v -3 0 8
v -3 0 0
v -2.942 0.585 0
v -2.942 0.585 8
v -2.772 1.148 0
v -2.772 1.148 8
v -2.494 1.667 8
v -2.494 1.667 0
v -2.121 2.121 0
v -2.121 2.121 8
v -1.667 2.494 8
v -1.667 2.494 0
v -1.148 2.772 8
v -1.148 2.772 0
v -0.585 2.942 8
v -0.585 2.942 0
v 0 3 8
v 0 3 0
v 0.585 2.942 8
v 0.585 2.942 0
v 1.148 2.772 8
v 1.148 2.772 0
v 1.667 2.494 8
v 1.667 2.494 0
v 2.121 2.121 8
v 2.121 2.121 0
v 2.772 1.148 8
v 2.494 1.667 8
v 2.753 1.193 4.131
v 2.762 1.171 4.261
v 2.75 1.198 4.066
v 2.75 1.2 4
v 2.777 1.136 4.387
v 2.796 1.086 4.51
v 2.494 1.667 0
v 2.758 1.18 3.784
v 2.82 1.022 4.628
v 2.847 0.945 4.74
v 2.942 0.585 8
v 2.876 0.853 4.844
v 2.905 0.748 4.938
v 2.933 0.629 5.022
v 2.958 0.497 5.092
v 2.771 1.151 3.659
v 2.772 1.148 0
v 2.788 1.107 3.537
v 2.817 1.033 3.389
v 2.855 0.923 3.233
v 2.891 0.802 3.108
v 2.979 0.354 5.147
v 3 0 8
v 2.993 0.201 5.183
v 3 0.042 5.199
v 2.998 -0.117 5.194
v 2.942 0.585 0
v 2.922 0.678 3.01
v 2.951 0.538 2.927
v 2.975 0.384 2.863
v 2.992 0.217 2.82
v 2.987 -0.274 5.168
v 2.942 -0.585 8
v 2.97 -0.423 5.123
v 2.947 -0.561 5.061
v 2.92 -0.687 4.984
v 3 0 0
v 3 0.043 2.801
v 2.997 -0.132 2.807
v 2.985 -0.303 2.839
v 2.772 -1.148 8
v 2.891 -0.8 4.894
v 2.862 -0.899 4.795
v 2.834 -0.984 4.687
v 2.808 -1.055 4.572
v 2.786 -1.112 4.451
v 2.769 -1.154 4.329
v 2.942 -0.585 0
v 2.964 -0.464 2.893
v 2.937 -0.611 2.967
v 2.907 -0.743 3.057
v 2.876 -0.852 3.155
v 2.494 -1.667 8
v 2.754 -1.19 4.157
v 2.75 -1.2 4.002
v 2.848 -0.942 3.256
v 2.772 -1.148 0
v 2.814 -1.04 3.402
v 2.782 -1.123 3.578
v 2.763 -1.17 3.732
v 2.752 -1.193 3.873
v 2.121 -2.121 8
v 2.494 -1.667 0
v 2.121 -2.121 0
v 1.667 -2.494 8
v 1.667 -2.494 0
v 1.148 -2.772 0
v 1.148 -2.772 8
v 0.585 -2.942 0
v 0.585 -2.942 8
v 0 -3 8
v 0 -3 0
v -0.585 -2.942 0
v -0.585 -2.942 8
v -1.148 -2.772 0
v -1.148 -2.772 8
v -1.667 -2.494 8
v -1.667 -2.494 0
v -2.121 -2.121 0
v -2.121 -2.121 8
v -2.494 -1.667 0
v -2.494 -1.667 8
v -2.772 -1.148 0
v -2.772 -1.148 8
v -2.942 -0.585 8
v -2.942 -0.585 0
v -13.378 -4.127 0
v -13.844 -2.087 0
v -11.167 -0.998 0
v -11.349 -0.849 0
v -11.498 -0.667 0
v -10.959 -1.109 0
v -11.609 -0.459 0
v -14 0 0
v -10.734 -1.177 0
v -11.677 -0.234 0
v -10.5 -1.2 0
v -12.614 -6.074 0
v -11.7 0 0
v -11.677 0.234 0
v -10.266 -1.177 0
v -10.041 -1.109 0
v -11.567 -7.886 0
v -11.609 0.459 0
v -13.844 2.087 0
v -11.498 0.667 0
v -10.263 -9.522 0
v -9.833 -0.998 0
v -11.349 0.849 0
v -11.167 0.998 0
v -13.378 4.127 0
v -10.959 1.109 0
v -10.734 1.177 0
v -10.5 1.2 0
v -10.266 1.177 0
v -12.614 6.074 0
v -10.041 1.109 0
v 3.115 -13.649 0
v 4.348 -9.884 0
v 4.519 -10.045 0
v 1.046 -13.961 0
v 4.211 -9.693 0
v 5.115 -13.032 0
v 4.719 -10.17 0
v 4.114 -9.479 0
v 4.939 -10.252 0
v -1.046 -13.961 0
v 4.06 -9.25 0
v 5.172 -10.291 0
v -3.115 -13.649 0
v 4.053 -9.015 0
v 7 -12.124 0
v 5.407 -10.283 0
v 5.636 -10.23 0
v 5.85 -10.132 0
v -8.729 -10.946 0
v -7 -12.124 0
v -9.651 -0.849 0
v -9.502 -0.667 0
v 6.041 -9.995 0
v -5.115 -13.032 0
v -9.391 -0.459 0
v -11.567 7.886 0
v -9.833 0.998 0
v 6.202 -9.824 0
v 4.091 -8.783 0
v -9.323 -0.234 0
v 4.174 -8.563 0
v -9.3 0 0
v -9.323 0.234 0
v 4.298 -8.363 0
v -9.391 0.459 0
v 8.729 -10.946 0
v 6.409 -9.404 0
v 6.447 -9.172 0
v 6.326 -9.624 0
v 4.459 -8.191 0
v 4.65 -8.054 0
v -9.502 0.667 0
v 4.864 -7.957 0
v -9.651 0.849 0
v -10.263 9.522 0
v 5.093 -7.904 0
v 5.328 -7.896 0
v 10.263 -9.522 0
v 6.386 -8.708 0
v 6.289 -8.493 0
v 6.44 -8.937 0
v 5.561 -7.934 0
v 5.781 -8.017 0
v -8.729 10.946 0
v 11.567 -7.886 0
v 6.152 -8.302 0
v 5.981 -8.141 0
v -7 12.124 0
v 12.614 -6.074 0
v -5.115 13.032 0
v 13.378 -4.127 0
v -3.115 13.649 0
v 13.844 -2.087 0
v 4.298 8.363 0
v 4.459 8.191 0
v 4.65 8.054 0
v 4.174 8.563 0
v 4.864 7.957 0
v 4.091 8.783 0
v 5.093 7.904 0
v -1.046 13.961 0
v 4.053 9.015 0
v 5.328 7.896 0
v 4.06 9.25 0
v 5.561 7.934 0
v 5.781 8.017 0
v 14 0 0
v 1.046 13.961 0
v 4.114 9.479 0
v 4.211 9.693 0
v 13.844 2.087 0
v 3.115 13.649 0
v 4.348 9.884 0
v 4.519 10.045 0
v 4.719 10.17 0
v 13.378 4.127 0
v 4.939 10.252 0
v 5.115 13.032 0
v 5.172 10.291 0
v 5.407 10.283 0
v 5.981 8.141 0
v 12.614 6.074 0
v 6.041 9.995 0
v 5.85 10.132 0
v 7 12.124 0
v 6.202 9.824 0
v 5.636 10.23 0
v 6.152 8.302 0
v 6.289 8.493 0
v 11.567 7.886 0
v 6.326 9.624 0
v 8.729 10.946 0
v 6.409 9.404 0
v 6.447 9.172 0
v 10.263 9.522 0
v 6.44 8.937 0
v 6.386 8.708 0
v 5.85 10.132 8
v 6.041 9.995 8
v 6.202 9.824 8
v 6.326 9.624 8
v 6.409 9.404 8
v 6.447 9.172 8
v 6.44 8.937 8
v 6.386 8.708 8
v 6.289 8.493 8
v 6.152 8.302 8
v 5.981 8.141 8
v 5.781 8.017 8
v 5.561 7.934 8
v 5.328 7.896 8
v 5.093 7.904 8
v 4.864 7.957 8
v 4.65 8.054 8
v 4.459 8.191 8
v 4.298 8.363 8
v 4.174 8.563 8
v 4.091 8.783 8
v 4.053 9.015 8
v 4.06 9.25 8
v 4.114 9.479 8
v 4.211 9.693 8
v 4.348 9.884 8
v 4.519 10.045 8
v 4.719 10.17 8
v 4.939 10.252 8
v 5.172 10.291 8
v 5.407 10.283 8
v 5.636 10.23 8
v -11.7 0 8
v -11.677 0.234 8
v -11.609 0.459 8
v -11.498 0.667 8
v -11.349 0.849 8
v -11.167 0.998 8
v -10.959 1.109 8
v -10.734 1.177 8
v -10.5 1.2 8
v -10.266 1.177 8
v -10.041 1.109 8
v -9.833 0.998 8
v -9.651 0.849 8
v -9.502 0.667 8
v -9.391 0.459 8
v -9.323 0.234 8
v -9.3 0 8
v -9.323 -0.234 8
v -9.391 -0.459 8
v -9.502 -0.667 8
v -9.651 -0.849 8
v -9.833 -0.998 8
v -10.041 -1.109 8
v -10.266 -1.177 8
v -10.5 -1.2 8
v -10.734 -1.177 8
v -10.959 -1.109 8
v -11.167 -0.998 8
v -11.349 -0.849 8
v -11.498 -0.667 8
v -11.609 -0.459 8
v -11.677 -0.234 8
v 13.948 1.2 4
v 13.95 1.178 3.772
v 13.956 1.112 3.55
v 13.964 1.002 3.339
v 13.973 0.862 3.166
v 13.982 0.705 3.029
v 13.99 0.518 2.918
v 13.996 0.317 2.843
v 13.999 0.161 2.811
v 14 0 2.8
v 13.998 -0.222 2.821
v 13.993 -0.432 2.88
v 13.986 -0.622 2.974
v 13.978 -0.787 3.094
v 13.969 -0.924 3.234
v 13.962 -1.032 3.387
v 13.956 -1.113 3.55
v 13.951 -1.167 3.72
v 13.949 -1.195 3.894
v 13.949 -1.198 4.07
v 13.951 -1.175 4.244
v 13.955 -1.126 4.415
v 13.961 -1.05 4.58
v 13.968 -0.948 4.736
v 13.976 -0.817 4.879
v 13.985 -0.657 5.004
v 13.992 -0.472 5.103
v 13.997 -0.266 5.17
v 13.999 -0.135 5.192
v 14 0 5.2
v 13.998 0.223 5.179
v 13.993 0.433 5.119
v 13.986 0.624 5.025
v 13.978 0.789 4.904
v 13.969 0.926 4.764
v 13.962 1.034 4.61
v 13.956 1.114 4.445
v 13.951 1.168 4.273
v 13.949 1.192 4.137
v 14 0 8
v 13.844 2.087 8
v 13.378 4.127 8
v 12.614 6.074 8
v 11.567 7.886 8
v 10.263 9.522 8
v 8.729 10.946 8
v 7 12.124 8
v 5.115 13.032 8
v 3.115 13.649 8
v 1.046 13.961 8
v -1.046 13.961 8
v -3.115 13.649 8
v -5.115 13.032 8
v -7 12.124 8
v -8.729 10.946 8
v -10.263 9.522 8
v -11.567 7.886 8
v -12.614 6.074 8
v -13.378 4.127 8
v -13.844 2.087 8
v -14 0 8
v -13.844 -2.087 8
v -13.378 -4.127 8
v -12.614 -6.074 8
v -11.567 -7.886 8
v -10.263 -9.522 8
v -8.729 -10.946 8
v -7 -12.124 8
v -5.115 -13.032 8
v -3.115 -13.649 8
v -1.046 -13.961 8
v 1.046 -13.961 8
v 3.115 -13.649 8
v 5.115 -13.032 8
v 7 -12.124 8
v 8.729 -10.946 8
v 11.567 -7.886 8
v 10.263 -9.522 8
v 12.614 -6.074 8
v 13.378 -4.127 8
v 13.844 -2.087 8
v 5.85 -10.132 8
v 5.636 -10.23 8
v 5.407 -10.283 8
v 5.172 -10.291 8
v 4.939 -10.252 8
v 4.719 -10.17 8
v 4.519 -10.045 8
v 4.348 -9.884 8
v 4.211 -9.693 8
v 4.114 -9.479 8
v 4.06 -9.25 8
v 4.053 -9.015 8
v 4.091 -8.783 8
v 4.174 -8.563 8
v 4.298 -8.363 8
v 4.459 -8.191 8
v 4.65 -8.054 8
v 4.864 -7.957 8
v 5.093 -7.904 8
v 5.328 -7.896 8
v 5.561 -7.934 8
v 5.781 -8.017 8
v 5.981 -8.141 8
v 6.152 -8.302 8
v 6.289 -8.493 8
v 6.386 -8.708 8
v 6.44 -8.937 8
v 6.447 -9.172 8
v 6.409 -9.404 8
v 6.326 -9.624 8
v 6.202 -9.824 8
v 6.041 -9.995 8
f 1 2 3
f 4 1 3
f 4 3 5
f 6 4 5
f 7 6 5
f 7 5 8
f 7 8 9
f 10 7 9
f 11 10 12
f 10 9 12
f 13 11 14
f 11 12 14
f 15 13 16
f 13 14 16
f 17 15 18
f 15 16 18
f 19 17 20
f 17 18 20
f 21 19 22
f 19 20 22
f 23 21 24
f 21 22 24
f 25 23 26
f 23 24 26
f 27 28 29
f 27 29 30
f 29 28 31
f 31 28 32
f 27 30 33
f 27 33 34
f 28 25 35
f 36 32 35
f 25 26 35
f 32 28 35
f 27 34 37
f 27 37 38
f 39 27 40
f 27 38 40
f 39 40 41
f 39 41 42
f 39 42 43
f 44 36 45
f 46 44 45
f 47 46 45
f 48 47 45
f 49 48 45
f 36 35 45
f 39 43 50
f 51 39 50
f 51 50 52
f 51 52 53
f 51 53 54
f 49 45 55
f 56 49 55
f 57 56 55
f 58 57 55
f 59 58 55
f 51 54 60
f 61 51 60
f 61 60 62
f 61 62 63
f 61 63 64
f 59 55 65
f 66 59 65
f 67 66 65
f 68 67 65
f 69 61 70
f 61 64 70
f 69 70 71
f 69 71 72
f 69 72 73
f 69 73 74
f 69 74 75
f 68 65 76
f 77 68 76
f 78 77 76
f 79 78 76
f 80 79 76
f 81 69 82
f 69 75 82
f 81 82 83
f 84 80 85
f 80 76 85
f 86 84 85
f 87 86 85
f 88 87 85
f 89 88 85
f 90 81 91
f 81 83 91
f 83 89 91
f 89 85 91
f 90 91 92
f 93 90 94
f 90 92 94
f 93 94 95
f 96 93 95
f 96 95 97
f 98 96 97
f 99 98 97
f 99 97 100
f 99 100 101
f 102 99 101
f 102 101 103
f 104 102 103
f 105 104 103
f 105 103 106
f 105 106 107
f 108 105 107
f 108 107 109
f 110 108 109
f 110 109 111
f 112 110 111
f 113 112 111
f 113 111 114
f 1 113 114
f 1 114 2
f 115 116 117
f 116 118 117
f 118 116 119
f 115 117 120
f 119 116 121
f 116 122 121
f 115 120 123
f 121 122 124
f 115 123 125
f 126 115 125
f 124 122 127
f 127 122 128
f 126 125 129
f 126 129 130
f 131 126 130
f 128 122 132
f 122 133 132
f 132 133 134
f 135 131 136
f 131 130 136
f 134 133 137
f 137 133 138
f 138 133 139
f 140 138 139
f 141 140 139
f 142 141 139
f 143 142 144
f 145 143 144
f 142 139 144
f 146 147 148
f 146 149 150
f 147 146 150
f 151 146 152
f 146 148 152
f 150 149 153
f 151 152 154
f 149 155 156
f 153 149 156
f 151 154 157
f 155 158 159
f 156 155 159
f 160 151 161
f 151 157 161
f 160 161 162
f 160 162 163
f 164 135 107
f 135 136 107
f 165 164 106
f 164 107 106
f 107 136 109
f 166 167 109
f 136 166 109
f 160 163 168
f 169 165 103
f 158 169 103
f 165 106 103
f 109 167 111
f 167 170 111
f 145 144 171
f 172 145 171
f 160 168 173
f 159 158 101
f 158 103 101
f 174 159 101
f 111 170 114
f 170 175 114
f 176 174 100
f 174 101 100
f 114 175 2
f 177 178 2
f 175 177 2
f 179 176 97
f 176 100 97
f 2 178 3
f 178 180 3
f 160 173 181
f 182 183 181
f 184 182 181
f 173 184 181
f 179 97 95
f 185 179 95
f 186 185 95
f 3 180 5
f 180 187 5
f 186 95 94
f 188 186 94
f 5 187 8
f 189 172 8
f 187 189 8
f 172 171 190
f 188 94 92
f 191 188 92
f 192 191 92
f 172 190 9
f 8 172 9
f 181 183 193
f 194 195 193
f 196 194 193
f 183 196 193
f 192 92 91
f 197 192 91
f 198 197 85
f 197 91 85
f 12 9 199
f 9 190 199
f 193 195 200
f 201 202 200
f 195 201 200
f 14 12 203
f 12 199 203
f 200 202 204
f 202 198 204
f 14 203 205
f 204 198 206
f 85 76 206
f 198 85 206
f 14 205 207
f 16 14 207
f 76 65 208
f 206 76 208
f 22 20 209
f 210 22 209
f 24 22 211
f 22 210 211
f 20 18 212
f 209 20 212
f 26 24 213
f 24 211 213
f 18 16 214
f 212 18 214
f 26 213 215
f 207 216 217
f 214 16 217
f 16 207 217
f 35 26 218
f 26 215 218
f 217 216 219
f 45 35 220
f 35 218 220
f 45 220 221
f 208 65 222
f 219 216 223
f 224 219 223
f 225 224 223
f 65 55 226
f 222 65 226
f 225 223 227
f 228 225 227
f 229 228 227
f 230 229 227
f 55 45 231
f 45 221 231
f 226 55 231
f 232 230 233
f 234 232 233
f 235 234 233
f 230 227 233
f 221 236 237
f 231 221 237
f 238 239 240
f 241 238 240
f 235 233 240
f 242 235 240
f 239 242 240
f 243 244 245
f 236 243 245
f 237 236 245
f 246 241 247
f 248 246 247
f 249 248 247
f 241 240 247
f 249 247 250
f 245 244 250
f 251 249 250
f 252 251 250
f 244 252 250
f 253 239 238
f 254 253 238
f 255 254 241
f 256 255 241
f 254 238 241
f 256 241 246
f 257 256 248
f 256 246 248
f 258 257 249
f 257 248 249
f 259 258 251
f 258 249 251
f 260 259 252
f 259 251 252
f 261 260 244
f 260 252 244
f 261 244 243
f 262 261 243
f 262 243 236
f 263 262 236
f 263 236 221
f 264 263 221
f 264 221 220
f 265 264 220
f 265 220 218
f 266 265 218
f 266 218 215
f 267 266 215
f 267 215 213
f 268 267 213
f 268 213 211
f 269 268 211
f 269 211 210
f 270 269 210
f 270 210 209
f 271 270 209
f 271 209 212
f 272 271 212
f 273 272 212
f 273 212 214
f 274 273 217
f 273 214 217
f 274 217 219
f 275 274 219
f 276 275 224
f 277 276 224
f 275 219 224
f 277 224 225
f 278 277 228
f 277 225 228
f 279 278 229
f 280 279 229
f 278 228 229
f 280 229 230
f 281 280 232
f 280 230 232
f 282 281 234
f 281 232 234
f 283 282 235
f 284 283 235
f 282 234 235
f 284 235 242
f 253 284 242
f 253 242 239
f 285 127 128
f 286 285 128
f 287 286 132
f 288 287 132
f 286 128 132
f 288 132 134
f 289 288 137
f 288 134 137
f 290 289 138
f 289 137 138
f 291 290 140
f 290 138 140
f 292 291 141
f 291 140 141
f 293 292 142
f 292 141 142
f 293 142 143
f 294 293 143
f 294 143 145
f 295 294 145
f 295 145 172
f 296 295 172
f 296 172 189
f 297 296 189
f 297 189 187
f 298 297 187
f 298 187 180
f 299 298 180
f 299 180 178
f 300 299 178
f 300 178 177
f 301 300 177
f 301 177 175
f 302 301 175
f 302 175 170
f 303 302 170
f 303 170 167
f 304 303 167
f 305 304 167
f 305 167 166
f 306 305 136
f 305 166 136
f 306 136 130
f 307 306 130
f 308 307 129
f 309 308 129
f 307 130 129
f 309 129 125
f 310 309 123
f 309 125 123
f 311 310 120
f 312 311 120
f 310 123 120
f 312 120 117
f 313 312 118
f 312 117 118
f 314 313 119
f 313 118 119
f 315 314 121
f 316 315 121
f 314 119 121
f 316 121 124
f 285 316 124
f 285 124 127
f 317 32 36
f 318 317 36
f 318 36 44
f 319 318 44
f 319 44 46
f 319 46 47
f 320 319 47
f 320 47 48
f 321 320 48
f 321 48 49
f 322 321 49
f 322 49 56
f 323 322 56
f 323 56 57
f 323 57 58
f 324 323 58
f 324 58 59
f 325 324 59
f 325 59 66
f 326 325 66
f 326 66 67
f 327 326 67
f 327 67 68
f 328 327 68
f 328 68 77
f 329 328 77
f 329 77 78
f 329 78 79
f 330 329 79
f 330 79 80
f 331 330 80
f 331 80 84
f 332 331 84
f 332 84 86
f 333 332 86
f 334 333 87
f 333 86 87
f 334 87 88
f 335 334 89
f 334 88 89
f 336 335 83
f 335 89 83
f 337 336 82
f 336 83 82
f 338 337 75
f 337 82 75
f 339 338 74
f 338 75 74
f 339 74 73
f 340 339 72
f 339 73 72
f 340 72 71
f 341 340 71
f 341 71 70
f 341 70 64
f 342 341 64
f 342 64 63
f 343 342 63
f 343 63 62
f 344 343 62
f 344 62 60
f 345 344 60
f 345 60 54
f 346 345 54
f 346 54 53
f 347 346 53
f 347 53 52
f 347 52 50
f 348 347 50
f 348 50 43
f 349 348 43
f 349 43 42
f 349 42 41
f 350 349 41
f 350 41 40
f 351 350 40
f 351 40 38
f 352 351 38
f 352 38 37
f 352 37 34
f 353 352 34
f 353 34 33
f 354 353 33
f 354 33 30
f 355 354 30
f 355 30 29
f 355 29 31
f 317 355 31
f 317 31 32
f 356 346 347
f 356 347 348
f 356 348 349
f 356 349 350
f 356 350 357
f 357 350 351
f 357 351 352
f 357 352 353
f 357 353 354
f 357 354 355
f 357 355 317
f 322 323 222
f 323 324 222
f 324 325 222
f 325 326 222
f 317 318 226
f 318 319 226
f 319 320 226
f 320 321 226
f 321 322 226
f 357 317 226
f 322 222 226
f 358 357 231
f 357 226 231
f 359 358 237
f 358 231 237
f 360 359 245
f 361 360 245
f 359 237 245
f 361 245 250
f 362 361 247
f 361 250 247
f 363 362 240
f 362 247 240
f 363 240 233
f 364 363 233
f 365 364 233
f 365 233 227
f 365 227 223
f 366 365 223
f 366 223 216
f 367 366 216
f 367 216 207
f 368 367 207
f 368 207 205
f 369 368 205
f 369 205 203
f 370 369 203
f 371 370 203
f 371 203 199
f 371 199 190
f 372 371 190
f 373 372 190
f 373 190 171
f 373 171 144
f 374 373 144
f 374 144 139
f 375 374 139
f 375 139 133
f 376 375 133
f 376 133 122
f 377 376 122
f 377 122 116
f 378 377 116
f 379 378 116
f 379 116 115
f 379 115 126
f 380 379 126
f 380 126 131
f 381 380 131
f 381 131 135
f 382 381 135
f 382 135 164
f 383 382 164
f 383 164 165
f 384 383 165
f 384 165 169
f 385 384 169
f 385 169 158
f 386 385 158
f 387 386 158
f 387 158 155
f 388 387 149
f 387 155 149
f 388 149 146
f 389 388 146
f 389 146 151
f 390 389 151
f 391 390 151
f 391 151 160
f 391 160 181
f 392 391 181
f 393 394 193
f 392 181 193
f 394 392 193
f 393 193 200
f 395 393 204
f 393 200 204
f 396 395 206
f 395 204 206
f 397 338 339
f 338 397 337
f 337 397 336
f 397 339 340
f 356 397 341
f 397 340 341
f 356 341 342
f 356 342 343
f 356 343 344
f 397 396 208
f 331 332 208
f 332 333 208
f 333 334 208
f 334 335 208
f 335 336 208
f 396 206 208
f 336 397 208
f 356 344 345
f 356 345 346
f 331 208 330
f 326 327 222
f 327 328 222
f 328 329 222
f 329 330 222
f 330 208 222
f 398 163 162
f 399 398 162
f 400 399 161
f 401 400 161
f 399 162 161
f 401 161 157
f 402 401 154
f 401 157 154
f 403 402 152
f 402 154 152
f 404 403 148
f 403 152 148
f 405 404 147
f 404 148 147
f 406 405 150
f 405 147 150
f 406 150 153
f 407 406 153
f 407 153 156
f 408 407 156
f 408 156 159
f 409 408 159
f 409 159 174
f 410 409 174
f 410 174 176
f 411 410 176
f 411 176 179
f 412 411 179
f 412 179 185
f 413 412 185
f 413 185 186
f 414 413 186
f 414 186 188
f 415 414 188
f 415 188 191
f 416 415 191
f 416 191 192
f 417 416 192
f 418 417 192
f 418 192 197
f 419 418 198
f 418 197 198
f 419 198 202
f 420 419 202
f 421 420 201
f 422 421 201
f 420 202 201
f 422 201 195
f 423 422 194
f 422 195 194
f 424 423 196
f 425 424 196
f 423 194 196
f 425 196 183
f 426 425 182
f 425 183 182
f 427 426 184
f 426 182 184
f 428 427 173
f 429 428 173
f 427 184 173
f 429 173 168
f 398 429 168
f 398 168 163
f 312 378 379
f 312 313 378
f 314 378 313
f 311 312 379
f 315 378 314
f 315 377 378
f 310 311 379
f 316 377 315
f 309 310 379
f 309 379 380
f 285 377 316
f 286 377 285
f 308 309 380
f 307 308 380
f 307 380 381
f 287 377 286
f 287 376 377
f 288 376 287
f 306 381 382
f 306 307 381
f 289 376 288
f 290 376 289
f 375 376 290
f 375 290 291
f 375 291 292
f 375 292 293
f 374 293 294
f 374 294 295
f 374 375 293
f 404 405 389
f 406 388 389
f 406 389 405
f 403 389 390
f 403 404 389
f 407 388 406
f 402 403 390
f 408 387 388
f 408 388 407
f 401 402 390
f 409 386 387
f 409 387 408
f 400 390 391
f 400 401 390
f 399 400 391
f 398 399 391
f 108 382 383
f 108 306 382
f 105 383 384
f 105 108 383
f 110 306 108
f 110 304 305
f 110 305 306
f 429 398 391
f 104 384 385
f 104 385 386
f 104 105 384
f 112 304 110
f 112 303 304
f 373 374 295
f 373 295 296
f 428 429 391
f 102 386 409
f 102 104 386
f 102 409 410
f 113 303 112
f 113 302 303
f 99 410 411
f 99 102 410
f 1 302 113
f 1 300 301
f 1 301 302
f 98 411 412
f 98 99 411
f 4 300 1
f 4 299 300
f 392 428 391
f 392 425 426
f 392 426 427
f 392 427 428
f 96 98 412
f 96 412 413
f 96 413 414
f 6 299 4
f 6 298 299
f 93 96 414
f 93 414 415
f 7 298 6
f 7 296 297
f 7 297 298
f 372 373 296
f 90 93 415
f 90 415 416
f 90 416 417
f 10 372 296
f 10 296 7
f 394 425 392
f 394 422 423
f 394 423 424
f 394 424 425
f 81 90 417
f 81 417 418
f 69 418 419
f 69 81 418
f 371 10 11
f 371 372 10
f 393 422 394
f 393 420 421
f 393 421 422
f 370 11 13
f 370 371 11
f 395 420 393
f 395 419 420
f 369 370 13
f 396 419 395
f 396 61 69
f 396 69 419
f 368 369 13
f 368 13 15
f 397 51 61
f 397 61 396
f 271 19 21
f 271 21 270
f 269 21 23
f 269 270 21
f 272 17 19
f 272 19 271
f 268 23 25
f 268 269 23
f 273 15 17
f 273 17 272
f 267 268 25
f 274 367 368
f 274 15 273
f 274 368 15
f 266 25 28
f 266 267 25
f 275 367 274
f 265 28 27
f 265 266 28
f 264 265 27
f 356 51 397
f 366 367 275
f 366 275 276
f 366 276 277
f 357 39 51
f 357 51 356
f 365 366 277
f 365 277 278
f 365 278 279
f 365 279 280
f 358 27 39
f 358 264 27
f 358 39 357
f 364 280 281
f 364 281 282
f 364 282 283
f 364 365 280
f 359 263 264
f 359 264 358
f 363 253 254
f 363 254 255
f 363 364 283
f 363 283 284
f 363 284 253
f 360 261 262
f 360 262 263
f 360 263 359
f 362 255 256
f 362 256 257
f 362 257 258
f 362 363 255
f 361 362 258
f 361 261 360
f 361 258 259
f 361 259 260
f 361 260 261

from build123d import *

# Parameters (mm, degrees)
F0_R            = 14
F1_DEPTH        = 8
F3_D            = 6
F4_D            = 2.4
F4_COPIES_COUNT = 3
F6_D            = 2.4
F6_DEPTH        = 14.001


# Not quite as in the source:
# - a pattern or mirror of a feature is missing from the dataset's text; its kind, count and spacing are read off the source's solid


with BuildPart() as f1:
    # F0 (on Top) → F1 (new body)
    with BuildSketch(Plane.XY):
        Circle(F0_R)
    extrude(amount=F1_DEPTH)

    # F3 (through all)
    with Locations(Plane.XY.offset(8)):
        with Locations((0, 0)):
            Hole(F3_D / 2)

    # F4 (through all)
    with Locations(Plane.XY.offset(8)):
        with Locations((-10.5, 0)):
            f4 = Hole(F4_D / 2)

    # F4_copies: F4 ×3 about axis
    f4_copies_axis = Axis((0, 0, 0), (0, 0, 1))
    for i in range(1, F4_COPIES_COUNT):
        add(f4.rotate(f4_copies_axis, i * 360 / F4_COPIES_COUNT), mode=Mode.SUBTRACT)

    # F6 (through all, one way)
    with BuildSketch(Plane(origin=(0, 0, 0), x_dir=(0, 1, 0), z_dir=(-1, 0, 0))):
        with Locations((0, -4)):
            Circle(F6_D / 2)
    extrude(amount=-F6_DEPTH, mode=Mode.SUBTRACT)


solid = f1.part
